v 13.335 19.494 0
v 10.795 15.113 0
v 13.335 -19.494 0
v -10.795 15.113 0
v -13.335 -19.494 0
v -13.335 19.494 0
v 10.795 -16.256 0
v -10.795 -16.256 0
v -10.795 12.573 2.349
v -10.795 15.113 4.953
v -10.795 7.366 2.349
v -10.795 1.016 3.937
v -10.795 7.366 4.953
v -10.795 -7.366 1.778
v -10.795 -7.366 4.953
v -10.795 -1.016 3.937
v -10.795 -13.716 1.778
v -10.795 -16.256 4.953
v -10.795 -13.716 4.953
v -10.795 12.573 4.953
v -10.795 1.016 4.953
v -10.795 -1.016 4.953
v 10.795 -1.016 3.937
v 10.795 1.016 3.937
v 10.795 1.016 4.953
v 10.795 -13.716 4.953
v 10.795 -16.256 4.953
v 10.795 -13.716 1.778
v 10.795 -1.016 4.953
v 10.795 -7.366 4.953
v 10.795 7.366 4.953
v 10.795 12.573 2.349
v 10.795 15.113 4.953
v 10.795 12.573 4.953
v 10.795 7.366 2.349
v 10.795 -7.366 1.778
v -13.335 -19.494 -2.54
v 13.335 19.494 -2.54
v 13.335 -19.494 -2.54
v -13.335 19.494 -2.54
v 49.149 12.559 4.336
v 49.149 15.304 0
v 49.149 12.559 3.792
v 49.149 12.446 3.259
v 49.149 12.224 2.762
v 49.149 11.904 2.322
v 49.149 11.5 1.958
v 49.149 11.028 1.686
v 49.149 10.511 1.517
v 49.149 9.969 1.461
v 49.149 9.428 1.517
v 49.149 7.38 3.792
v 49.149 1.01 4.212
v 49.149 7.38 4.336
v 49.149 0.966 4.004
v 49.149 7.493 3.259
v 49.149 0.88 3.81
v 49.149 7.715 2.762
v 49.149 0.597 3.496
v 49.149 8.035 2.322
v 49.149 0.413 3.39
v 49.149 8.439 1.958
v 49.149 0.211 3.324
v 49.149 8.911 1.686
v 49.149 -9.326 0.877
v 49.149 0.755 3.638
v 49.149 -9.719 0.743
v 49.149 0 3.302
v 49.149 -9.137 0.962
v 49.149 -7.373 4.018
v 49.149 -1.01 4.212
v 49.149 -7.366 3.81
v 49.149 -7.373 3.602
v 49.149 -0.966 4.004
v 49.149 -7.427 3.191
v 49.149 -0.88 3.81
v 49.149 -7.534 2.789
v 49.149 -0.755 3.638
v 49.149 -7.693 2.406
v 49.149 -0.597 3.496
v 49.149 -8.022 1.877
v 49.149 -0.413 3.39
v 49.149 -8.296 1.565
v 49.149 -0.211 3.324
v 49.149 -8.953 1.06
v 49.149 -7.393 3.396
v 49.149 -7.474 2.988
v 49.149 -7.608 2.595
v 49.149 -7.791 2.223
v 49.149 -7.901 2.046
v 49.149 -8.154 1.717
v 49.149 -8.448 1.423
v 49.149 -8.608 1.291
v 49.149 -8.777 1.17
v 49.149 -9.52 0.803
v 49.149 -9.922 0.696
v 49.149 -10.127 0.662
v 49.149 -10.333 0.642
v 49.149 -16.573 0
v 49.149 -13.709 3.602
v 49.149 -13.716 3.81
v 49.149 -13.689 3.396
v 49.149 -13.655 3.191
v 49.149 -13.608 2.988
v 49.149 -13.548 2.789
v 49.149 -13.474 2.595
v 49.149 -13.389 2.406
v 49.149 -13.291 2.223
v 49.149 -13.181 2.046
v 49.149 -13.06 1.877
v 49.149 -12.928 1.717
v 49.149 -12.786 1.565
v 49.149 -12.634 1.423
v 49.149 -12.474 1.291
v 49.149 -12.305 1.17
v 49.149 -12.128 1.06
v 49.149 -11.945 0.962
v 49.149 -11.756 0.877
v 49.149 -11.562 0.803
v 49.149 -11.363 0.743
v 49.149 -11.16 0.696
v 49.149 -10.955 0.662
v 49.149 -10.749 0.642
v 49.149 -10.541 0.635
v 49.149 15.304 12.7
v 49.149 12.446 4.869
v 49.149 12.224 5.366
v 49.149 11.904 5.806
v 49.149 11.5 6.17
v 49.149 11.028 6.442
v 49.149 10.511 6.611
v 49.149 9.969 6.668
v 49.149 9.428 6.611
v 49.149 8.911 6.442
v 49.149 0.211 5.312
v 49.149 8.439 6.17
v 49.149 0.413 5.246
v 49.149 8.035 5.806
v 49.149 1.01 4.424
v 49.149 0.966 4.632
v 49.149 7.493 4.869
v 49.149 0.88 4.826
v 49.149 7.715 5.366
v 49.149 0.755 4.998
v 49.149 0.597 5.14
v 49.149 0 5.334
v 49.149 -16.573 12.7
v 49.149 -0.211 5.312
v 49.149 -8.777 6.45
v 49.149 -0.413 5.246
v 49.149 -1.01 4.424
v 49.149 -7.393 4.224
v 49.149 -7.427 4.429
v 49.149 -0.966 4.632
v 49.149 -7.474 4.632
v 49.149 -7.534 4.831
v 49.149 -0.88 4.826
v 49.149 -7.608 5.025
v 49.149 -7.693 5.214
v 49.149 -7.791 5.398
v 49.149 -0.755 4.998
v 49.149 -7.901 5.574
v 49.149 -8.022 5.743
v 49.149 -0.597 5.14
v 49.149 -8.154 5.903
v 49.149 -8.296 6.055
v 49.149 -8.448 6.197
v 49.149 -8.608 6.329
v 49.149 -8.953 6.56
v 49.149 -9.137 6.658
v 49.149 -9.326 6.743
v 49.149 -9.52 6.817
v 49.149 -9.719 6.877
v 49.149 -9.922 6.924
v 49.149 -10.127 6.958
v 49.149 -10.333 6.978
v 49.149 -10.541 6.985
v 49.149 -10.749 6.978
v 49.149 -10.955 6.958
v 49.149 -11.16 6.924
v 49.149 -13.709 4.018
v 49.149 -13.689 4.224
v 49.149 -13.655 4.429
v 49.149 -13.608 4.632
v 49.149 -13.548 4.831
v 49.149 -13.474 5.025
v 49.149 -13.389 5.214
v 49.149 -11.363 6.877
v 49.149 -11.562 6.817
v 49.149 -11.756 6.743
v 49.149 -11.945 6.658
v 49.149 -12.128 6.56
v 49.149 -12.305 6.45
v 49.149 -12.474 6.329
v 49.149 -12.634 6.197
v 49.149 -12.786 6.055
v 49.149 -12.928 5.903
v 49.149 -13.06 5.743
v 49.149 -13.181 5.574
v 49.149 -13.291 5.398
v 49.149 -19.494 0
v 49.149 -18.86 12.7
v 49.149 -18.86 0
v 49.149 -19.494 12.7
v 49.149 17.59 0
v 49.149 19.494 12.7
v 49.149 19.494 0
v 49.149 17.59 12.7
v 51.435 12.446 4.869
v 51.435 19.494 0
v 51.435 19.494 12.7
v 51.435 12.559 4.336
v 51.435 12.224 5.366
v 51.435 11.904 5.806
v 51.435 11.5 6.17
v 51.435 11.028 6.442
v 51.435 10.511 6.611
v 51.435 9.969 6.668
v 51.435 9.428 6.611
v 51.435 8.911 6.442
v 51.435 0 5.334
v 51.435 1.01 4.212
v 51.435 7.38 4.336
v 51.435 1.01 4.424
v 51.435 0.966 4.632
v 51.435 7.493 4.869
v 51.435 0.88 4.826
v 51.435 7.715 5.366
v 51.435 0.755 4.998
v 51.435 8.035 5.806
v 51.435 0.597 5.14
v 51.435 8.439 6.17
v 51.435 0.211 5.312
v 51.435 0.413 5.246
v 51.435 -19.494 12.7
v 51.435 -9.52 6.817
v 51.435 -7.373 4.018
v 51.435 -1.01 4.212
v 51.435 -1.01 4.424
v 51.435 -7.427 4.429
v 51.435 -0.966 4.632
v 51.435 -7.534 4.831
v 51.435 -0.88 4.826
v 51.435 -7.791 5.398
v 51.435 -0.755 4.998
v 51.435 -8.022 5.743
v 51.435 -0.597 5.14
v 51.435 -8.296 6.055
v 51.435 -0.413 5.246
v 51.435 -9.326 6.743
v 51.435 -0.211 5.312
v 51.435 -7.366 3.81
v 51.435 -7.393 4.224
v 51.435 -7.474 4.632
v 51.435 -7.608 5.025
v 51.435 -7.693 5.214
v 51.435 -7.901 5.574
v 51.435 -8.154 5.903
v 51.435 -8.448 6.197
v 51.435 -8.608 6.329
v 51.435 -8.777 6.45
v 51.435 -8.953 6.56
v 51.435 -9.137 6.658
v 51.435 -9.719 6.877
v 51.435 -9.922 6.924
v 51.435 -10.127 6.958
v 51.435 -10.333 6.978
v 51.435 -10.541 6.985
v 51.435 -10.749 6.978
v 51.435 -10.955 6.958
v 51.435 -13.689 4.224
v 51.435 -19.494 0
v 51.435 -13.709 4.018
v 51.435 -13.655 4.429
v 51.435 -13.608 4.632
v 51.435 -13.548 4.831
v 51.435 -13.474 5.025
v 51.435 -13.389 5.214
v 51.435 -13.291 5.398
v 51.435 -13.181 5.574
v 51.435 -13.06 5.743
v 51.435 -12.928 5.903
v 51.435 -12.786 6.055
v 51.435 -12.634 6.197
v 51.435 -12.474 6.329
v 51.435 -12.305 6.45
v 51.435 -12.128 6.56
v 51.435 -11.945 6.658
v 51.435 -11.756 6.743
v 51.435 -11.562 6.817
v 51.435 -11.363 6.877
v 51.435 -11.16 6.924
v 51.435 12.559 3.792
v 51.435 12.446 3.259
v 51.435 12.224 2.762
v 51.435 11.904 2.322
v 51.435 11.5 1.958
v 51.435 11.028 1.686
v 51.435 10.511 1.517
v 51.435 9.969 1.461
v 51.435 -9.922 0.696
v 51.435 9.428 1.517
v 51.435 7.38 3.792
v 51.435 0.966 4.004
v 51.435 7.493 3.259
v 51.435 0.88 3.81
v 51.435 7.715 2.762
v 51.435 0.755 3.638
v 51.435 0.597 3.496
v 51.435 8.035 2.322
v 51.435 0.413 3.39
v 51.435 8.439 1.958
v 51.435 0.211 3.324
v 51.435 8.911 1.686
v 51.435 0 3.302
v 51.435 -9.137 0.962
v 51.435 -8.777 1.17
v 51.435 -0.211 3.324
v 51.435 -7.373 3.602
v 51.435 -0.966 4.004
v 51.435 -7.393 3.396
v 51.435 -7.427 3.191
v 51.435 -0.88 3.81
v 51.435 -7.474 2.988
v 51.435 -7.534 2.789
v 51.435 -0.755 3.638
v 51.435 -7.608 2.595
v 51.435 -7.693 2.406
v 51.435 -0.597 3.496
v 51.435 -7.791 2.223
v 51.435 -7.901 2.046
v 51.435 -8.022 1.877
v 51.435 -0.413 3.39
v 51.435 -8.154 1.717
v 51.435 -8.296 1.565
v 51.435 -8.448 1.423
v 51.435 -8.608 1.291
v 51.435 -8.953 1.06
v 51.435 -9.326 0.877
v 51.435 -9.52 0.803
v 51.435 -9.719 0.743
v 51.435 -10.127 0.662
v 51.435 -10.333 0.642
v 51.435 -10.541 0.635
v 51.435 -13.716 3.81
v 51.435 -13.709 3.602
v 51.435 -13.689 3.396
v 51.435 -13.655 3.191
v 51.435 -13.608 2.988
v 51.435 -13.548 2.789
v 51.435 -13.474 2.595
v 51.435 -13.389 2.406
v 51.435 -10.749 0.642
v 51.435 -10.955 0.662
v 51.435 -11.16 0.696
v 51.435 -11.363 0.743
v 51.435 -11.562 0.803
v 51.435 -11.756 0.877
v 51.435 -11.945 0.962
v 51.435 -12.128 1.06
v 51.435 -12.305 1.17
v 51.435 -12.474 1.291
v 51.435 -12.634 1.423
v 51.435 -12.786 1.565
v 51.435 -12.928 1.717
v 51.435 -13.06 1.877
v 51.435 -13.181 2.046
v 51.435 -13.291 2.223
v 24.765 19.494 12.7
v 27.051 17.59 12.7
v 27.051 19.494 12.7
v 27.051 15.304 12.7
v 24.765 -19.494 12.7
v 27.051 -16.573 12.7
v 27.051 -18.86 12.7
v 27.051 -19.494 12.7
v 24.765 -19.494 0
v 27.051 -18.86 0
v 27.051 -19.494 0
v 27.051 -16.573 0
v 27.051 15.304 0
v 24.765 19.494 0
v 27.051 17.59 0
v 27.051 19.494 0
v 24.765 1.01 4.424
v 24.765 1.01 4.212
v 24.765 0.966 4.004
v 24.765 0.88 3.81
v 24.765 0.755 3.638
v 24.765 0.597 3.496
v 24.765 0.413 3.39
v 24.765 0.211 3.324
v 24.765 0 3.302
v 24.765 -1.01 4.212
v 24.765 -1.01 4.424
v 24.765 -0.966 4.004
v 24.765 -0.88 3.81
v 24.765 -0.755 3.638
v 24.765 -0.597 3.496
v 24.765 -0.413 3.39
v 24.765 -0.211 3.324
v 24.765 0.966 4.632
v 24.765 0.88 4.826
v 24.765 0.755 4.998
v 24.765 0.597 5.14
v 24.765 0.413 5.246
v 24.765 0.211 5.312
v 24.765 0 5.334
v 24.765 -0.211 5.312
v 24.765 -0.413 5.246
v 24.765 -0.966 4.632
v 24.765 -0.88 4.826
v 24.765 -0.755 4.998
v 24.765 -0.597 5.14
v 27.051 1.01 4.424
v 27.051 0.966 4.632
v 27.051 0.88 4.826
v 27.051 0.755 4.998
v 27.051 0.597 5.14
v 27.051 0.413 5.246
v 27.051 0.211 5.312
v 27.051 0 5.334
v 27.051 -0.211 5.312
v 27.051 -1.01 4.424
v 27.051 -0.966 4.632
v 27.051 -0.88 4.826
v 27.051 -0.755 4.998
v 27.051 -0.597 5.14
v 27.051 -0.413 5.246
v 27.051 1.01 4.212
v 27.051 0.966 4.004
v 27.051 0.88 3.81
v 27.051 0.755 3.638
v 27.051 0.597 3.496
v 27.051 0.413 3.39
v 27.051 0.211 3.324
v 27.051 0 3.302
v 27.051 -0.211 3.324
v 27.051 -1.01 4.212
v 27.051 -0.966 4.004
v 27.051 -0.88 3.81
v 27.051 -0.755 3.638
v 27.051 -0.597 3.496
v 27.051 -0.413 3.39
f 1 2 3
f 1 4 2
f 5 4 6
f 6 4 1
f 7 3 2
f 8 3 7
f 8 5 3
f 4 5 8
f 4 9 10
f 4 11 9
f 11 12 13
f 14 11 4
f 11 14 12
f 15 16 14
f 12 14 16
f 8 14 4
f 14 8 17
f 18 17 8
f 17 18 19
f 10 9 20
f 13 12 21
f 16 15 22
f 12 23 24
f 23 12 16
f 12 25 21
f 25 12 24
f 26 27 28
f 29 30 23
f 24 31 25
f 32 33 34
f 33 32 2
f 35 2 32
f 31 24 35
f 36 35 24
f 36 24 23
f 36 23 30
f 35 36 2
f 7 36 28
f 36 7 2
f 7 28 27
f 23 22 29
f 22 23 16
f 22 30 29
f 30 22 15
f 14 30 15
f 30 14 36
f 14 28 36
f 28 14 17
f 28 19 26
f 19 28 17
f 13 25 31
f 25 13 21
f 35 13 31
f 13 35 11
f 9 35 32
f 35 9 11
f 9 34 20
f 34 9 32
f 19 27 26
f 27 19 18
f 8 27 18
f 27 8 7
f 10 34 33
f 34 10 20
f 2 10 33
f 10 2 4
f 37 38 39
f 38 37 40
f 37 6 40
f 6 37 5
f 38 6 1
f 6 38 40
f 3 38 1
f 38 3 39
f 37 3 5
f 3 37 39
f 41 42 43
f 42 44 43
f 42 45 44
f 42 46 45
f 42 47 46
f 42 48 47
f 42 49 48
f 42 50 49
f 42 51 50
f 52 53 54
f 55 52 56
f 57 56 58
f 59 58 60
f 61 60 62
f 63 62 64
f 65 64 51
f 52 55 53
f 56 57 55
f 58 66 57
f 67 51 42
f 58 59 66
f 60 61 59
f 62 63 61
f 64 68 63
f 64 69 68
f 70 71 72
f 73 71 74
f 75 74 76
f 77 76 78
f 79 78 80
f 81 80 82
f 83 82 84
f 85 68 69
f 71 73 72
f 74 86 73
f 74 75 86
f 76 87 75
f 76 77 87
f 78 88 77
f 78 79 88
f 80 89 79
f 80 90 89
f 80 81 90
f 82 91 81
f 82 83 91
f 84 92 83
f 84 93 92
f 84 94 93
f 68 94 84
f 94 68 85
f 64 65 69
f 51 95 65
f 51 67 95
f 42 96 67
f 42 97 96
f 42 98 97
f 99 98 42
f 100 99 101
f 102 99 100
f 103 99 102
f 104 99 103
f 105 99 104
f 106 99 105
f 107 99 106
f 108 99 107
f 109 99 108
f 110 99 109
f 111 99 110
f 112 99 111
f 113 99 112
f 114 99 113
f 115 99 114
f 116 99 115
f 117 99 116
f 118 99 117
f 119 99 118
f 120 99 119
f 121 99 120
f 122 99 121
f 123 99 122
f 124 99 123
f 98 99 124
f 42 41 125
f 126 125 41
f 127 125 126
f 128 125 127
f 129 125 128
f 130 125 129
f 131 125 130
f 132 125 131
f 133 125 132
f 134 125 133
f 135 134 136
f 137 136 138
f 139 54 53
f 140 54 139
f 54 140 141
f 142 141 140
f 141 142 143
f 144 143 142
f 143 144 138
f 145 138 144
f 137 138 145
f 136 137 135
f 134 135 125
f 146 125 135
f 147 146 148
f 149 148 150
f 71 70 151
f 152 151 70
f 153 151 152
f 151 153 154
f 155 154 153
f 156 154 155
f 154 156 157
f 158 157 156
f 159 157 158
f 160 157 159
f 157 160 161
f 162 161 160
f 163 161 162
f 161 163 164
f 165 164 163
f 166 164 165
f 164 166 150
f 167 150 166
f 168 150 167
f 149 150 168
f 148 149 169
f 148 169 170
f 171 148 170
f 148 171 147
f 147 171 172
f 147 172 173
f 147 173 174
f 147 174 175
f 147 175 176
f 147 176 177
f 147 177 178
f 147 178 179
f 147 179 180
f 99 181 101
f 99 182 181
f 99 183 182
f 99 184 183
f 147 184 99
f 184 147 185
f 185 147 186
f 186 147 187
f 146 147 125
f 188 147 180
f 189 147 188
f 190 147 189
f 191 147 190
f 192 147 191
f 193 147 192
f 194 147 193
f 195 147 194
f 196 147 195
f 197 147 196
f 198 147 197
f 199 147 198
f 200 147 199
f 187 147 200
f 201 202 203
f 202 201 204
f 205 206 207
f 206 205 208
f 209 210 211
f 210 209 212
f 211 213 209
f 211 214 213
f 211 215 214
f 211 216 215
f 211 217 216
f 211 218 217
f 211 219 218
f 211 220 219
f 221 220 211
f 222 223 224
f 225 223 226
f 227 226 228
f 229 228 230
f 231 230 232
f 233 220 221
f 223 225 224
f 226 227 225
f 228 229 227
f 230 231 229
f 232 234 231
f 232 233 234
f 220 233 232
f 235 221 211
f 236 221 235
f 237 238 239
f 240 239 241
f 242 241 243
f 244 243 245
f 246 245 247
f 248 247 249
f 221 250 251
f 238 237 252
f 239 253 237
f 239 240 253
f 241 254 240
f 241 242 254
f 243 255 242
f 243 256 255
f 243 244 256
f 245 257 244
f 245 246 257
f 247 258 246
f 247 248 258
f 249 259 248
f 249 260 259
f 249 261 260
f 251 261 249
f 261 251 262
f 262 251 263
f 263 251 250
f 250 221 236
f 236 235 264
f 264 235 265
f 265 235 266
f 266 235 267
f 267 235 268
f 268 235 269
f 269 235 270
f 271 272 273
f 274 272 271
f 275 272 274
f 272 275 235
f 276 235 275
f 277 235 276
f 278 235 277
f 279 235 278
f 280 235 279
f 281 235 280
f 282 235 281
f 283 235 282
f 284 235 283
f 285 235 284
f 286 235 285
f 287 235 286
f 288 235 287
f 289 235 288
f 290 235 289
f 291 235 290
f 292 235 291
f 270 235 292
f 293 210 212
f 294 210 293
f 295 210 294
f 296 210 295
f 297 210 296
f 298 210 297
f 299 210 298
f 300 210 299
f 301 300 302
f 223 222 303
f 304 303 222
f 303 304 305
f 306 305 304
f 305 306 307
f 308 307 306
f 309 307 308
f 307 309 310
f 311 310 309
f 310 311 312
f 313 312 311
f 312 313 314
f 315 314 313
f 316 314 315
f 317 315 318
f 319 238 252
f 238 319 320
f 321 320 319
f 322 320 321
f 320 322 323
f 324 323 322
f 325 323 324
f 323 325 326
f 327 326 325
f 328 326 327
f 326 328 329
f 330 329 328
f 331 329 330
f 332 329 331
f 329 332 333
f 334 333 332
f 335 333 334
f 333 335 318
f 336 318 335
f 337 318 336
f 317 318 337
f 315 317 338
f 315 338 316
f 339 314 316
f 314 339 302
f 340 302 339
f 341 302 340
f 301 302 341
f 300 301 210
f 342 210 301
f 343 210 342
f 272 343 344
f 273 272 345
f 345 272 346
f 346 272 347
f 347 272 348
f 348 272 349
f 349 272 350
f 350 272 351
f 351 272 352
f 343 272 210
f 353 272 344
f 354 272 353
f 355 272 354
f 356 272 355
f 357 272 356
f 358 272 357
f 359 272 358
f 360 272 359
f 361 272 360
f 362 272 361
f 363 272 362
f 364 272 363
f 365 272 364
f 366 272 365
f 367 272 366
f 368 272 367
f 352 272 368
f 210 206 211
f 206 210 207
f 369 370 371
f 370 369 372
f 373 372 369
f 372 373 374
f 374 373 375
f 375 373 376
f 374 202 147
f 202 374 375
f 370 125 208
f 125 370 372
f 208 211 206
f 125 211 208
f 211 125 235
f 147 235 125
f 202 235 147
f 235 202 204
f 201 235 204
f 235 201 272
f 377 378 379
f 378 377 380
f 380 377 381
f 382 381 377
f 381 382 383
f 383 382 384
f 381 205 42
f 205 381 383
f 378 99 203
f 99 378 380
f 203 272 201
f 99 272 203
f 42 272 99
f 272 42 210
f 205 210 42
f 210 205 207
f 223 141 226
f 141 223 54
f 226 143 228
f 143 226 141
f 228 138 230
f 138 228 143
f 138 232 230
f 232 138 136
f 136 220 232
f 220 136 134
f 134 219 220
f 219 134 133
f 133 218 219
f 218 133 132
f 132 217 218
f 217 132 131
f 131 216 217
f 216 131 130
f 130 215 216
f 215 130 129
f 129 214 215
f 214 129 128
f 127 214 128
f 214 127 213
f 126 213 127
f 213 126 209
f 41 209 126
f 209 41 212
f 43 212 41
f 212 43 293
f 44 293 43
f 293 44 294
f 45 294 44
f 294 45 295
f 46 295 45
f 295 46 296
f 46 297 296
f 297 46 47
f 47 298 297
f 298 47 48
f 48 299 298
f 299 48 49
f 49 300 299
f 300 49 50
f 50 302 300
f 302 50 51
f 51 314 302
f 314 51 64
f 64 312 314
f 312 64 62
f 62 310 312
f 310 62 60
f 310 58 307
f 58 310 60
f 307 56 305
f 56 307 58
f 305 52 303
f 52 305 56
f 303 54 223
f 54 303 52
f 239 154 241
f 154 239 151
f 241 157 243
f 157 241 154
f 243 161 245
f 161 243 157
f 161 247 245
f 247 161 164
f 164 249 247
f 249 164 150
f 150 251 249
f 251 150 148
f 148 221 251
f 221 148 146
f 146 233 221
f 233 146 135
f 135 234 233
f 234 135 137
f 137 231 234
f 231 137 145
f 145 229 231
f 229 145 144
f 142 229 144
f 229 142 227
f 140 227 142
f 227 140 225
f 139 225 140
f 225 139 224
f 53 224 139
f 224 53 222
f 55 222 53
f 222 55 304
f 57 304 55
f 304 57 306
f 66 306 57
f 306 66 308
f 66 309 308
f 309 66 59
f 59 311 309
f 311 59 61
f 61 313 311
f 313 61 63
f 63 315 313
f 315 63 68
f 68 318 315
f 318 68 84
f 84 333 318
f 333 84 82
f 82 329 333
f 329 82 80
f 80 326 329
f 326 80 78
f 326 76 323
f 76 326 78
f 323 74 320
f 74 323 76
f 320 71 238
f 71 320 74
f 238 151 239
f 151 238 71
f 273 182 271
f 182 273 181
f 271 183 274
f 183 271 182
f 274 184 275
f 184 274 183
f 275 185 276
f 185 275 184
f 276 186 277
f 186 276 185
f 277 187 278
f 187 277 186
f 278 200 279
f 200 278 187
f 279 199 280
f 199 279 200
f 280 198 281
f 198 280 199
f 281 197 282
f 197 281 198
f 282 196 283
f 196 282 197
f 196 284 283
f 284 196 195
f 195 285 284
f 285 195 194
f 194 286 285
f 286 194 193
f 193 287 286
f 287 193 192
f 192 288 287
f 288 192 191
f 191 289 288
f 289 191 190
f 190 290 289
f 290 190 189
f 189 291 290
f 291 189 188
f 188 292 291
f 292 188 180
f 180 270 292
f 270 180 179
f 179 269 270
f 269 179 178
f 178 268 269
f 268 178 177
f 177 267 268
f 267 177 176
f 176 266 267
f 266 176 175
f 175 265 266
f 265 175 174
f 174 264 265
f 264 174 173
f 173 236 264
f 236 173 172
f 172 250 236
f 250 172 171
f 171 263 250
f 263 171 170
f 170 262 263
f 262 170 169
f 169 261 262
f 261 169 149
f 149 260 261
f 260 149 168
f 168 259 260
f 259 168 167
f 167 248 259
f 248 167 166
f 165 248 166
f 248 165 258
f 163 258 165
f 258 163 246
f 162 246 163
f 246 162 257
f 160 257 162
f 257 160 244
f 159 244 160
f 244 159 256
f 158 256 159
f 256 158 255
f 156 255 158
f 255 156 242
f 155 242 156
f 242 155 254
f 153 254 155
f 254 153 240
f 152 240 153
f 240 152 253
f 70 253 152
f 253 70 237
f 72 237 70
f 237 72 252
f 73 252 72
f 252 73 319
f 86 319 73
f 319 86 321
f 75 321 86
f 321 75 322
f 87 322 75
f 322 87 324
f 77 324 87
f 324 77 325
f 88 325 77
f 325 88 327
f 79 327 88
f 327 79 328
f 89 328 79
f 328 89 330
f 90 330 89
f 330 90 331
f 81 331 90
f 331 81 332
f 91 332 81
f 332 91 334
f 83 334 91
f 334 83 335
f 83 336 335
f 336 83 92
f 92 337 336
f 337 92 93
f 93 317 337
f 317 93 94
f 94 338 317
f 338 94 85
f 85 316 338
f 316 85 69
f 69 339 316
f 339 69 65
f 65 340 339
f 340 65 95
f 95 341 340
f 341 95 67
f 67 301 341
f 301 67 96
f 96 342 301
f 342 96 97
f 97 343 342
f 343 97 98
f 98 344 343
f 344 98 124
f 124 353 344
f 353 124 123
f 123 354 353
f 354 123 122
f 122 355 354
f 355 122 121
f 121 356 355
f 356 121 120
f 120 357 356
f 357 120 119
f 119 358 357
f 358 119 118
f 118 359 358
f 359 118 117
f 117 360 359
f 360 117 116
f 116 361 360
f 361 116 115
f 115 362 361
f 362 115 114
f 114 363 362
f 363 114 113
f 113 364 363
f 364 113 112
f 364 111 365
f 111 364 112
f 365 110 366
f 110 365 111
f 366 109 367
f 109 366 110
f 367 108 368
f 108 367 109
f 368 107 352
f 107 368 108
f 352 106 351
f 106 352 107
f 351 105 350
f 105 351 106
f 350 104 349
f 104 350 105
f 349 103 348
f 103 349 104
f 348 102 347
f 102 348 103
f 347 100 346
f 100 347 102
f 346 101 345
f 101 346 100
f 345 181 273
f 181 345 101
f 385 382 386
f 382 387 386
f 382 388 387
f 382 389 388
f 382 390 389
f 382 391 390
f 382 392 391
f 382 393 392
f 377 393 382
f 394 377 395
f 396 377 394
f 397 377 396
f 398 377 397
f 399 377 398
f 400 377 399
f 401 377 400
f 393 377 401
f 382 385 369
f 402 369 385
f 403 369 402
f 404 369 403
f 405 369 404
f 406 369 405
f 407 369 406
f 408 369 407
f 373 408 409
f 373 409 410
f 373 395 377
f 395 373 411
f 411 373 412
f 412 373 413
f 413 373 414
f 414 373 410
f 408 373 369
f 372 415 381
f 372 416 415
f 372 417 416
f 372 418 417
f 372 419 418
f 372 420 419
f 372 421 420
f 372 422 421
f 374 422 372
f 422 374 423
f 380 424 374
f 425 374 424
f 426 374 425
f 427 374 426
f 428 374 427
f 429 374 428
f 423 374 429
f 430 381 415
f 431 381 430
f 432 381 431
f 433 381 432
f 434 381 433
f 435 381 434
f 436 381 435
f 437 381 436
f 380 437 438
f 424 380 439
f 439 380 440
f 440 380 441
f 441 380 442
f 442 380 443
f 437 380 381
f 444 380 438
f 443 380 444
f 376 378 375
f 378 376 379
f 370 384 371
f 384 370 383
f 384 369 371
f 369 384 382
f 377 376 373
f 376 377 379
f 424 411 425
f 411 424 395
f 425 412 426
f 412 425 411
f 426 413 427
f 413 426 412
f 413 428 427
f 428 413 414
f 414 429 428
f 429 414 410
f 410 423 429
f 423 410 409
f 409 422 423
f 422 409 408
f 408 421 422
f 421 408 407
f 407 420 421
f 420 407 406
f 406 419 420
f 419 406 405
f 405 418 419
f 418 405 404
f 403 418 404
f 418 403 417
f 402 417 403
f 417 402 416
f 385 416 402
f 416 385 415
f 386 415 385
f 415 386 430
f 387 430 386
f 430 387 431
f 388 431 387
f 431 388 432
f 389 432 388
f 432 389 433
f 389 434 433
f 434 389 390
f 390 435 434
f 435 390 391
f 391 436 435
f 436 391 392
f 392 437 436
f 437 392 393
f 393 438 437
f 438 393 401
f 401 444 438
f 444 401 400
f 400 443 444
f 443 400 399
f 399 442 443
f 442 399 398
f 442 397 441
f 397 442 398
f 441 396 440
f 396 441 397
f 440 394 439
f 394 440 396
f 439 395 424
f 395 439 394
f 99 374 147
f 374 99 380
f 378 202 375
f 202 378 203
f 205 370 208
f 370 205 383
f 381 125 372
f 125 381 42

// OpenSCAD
ViewScale = [0.0254, 0.0254, 0.0254];
lidWidth = 850;
heaterR = 120+5;
heaterD = heaterR * 2;
sensorD = 195+10;
sensorR = sensorD/2;
filR = 35+5;
filD = filR * 2;
fillAW = 250;
fillBW = 250;
baseHeight = 70;
wallThick = 100;

filamentTx = 0;
fillATx = -(fillAW/2 + filR);
heaterTx = -(filR + fillAW + heaterR);
fillBTx = filR + (fillBW/2);
sensorTx = filR + fillBW + sensorR;
wallATx =  -(filR + fillAW + heaterD + wallThick/2);
wallBTx = filR + fillBW + sensorD + wallThick/2;

module lid()
{

    // filament
    linear_extrude(baseHeight + heaterR - filR)
    square([lidWidth, filD], center=true); 

    // fillA between filament and heater
    linear_extrude(baseHeight + heaterR) translate([0, fillATx, 0])
    square([lidWidth, fillAW], center=true);

    // heater
    linear_extrude(baseHeight)
    translate([0, heaterTx, 0]) square([lidWidth, heaterD], center=true);

    // fillB between filament and temp sensor
    linear_extrude(baseHeight + heaterR)
    translate([0, fillBTx, 0])
    square([lidWidth, fillBW], center=true);

    // temp sensor
    linear_extrude(baseHeight + heaterR - sensorR)
    translate([0, sensorTx, 0])
    square([lidWidth, sensorD], center=true);

    // wall A
    linear_extrude(baseHeight + heaterR)
    translate([0, wallATx, 0])
    square([lidWidth, wallThick], center = true);

    // wall B
    linear_extrude(baseHeight + heaterR)
    translate([0, wallBTx, 0])
    square([lidWidth, wallThick], center = true);

    translate([0, 0, -100])
    linear_extrude(100)
    square([lidWidth + 200, wallBTx+(-wallATx)+400], center=true);
}

module wall1()
{
    // wall 1
    translate([lidWidth/2+10, 0, 250]) rotate([0, 90, 0])
    linear_extrude(90)
    difference() {
    square([500, wallBTx+(-wallATx)+400], center=true);
    union() {
        translate([100, heaterTx, 0])
        circle(heaterR, $fn=96);
        translate([80, 0, 0])
        circle(filR, $fn-96);
        translate([90, sensorTx, 0])
        circle(sensorR, $fn-96);
    } }
}

module wall2()
{
    // wall 1
    translate([-(lidWidth/2+100), 0, 250]) rotate([0, 90, 0])
    linear_extrude(90)
    difference() {
    square([500, wallBTx+(-wallATx)+400], center=true);
    union() {
//        translate([100, heaterTx, 0])
//        circle(heaterR*2/3, $fn=96);
        translate([80, 0, 0])
        circle(filR, $fn-96);
//        translate([90, sensorTx, 0])
//        circle(sensorR/3*2, $fn-96);
    } }
}

module case()
{
    wall1();
    wall2();
    translate([0, -(wallBTx+(-wallATx)+260)/2, 0])
    linear_extrude(500)
    square([lidWidth+20, 90], center=true);
    translate([0, (wallBTx+(-wallATx)+160)/2, 0])
    linear_extrude(500)
    square([lidWidth+20, 90], center=true);
}

scale(ViewScale)
{
    lid();
    translate([1500, 0, 0])
    case();
}
